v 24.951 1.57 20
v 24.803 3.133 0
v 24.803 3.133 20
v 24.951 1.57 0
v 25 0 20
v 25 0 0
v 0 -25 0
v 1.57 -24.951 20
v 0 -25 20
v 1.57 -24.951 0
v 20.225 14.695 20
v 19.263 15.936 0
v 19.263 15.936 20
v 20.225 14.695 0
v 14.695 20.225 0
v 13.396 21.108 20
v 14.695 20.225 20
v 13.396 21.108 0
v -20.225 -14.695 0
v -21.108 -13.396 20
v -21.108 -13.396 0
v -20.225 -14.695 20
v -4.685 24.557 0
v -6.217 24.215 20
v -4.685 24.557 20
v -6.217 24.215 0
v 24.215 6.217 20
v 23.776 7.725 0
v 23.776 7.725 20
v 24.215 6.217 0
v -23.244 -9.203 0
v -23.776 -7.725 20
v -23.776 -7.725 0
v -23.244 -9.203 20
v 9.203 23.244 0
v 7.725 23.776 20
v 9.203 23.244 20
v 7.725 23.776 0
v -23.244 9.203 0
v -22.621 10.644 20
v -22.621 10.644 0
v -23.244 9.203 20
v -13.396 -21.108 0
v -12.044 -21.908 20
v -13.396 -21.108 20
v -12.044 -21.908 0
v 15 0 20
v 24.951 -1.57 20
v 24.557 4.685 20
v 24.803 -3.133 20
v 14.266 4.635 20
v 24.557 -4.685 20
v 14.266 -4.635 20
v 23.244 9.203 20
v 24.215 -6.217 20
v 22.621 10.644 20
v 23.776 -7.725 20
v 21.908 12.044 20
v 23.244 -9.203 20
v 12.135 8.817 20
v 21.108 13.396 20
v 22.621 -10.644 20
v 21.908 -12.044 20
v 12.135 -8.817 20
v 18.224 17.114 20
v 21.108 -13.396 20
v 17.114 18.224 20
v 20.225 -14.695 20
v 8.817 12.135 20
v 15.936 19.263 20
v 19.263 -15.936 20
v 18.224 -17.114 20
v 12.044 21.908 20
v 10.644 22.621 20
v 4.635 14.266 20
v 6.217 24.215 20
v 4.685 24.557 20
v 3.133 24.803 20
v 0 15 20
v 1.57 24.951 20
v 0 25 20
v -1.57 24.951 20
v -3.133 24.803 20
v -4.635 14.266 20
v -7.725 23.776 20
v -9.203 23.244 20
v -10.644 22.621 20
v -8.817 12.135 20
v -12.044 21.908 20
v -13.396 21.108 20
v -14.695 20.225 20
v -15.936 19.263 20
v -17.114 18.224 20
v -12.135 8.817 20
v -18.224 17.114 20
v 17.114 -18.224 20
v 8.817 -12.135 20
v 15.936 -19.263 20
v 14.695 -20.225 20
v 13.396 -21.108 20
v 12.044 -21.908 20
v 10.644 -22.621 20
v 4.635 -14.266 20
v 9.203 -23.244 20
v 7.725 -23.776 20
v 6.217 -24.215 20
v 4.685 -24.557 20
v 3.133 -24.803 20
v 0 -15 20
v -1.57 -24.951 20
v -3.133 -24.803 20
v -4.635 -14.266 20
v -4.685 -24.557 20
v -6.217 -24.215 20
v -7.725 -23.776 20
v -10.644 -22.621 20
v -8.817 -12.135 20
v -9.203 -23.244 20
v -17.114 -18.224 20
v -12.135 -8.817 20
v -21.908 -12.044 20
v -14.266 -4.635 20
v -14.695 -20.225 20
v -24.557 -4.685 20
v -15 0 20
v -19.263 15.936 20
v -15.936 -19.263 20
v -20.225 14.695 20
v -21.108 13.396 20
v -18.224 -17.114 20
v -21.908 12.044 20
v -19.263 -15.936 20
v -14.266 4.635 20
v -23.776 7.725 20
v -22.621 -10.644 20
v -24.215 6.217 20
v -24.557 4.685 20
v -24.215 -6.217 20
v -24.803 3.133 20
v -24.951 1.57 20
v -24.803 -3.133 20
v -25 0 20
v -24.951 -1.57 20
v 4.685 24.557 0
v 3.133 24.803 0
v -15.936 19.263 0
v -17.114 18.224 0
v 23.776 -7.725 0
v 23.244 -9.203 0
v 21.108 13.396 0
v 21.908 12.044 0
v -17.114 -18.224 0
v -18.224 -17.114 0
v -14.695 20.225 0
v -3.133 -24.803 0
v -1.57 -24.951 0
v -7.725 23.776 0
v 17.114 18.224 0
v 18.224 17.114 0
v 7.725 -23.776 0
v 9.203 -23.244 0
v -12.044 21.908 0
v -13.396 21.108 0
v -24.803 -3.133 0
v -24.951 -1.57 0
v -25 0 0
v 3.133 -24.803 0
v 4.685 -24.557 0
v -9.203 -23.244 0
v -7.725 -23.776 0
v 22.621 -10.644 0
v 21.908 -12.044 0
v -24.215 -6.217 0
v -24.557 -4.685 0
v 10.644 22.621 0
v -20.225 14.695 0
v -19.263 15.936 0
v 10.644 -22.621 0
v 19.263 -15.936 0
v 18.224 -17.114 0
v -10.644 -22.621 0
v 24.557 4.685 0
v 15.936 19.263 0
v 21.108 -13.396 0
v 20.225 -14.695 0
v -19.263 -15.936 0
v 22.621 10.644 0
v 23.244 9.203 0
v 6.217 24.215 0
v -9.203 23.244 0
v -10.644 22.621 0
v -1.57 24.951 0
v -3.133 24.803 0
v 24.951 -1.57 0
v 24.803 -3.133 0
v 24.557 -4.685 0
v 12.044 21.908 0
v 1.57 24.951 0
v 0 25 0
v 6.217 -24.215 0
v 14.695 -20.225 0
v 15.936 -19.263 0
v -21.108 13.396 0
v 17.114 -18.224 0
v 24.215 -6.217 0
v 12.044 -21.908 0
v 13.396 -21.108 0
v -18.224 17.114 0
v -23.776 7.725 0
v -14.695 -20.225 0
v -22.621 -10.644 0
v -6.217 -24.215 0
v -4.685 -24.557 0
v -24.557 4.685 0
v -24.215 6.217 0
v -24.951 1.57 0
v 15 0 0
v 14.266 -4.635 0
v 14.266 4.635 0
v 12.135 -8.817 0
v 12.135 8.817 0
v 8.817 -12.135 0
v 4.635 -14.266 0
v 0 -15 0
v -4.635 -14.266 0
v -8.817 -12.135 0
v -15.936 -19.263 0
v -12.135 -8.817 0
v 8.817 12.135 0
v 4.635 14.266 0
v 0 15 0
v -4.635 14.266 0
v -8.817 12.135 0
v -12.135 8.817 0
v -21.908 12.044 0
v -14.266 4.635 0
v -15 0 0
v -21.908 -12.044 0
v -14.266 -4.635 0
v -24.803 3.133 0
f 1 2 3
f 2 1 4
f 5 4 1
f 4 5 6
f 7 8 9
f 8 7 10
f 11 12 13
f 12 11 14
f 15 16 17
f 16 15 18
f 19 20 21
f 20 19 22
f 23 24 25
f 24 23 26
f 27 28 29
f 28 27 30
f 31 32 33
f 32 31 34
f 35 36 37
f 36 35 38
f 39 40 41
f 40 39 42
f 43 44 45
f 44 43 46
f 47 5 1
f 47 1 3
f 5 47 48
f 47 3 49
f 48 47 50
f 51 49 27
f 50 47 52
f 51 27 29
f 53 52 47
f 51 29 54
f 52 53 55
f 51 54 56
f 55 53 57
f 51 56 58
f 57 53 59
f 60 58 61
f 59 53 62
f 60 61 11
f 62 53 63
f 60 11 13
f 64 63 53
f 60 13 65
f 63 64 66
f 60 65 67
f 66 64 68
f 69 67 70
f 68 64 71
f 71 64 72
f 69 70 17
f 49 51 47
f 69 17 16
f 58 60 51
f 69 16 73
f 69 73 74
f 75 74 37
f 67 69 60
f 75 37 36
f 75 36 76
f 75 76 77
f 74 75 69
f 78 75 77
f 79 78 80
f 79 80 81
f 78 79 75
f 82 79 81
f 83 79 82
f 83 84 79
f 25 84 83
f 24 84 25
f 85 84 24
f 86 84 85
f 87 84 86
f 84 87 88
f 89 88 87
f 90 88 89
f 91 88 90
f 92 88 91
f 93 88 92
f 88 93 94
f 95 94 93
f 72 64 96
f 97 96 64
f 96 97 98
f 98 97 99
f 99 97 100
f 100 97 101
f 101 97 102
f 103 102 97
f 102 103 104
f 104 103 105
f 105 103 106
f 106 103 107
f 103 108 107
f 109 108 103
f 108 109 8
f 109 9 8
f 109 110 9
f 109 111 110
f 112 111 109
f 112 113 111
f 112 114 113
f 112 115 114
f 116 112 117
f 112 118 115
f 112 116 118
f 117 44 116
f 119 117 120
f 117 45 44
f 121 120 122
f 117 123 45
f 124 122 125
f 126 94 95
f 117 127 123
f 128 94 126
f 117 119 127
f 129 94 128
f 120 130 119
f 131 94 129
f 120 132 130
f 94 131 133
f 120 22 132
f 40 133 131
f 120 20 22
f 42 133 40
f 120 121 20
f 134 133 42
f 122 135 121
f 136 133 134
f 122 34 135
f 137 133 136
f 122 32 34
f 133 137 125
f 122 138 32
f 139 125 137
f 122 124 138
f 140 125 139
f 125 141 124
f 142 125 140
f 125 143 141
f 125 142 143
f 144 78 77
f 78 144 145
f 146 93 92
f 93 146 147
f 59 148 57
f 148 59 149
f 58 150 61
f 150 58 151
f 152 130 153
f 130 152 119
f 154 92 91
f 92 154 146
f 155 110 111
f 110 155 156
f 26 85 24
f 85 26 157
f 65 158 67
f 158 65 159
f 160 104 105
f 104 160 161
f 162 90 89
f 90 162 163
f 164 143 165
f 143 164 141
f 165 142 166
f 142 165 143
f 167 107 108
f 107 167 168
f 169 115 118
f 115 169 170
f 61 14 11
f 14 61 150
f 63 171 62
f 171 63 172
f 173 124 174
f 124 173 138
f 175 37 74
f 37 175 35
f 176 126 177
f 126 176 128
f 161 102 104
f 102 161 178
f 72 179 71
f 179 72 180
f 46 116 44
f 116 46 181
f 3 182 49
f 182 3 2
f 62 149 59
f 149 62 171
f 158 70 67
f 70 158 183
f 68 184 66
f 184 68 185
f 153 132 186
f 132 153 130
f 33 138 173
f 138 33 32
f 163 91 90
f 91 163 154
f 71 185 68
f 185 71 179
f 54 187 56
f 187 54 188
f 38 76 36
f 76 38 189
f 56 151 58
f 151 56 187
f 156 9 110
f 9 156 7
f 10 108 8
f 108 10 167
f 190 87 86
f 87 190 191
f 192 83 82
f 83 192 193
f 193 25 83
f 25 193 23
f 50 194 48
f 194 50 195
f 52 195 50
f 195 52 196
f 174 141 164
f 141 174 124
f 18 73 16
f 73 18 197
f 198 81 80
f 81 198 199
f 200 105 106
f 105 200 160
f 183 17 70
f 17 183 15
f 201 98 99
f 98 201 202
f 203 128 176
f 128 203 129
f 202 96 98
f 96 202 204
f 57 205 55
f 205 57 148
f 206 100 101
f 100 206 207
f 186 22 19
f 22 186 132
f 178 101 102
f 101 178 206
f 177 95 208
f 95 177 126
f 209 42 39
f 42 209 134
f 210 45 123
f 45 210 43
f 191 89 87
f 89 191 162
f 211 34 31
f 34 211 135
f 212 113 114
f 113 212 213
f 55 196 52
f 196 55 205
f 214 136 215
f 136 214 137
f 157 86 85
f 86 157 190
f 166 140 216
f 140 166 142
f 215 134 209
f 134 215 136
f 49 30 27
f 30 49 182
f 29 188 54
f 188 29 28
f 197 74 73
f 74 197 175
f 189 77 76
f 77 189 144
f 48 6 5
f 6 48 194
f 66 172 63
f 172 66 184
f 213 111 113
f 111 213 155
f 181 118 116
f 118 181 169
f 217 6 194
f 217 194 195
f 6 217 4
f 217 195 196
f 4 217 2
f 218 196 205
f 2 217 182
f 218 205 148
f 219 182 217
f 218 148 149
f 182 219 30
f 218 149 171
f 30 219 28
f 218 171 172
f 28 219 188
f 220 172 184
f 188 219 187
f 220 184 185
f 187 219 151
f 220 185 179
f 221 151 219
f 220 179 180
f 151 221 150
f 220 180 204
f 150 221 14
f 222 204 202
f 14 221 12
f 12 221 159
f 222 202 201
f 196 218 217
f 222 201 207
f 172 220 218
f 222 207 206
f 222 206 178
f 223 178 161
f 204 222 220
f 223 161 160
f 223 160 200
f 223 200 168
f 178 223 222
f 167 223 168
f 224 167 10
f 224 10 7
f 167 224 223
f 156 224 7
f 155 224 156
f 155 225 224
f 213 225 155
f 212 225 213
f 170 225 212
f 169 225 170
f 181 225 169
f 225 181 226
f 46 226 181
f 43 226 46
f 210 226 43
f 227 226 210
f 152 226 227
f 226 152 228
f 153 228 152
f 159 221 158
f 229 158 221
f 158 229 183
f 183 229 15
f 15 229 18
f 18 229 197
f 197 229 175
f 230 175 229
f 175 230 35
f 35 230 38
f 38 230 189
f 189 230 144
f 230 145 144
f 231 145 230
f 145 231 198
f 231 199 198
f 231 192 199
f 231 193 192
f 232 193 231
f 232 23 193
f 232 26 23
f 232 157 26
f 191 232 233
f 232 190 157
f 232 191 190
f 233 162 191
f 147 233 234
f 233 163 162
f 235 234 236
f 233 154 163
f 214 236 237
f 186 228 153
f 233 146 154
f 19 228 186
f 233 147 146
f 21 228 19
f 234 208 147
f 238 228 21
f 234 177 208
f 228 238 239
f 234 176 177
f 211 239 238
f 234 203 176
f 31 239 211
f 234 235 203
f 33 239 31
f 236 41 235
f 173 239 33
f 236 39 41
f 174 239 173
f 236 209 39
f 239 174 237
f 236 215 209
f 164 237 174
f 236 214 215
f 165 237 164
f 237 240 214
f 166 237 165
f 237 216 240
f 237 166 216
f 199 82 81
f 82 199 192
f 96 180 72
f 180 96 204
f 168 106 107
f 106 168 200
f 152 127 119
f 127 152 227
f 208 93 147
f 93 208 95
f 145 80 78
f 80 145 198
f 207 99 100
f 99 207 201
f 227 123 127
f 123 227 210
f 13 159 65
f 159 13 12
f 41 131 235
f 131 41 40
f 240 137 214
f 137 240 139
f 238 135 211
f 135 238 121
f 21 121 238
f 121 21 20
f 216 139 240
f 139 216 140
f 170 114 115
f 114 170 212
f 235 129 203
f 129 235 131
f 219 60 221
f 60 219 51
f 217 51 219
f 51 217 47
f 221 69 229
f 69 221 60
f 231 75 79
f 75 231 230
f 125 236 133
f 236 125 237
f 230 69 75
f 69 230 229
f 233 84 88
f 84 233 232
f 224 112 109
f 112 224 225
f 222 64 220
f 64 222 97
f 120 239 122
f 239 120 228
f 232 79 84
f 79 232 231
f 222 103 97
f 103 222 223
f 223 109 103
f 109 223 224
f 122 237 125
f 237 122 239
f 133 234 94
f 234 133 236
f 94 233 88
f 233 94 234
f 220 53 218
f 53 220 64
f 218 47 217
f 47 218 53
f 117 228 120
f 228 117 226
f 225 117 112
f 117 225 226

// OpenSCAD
//Comando para restar una fígura en otra.


grosor = 20;
diametro = 50;
diam_eje = 30;

difference(){

  cylinder(r=diametro/2, h=grosor, $fn=100);

  cylinder(r=diam_eje/2, h=3*grosor, $fn=20, center=true);
}
